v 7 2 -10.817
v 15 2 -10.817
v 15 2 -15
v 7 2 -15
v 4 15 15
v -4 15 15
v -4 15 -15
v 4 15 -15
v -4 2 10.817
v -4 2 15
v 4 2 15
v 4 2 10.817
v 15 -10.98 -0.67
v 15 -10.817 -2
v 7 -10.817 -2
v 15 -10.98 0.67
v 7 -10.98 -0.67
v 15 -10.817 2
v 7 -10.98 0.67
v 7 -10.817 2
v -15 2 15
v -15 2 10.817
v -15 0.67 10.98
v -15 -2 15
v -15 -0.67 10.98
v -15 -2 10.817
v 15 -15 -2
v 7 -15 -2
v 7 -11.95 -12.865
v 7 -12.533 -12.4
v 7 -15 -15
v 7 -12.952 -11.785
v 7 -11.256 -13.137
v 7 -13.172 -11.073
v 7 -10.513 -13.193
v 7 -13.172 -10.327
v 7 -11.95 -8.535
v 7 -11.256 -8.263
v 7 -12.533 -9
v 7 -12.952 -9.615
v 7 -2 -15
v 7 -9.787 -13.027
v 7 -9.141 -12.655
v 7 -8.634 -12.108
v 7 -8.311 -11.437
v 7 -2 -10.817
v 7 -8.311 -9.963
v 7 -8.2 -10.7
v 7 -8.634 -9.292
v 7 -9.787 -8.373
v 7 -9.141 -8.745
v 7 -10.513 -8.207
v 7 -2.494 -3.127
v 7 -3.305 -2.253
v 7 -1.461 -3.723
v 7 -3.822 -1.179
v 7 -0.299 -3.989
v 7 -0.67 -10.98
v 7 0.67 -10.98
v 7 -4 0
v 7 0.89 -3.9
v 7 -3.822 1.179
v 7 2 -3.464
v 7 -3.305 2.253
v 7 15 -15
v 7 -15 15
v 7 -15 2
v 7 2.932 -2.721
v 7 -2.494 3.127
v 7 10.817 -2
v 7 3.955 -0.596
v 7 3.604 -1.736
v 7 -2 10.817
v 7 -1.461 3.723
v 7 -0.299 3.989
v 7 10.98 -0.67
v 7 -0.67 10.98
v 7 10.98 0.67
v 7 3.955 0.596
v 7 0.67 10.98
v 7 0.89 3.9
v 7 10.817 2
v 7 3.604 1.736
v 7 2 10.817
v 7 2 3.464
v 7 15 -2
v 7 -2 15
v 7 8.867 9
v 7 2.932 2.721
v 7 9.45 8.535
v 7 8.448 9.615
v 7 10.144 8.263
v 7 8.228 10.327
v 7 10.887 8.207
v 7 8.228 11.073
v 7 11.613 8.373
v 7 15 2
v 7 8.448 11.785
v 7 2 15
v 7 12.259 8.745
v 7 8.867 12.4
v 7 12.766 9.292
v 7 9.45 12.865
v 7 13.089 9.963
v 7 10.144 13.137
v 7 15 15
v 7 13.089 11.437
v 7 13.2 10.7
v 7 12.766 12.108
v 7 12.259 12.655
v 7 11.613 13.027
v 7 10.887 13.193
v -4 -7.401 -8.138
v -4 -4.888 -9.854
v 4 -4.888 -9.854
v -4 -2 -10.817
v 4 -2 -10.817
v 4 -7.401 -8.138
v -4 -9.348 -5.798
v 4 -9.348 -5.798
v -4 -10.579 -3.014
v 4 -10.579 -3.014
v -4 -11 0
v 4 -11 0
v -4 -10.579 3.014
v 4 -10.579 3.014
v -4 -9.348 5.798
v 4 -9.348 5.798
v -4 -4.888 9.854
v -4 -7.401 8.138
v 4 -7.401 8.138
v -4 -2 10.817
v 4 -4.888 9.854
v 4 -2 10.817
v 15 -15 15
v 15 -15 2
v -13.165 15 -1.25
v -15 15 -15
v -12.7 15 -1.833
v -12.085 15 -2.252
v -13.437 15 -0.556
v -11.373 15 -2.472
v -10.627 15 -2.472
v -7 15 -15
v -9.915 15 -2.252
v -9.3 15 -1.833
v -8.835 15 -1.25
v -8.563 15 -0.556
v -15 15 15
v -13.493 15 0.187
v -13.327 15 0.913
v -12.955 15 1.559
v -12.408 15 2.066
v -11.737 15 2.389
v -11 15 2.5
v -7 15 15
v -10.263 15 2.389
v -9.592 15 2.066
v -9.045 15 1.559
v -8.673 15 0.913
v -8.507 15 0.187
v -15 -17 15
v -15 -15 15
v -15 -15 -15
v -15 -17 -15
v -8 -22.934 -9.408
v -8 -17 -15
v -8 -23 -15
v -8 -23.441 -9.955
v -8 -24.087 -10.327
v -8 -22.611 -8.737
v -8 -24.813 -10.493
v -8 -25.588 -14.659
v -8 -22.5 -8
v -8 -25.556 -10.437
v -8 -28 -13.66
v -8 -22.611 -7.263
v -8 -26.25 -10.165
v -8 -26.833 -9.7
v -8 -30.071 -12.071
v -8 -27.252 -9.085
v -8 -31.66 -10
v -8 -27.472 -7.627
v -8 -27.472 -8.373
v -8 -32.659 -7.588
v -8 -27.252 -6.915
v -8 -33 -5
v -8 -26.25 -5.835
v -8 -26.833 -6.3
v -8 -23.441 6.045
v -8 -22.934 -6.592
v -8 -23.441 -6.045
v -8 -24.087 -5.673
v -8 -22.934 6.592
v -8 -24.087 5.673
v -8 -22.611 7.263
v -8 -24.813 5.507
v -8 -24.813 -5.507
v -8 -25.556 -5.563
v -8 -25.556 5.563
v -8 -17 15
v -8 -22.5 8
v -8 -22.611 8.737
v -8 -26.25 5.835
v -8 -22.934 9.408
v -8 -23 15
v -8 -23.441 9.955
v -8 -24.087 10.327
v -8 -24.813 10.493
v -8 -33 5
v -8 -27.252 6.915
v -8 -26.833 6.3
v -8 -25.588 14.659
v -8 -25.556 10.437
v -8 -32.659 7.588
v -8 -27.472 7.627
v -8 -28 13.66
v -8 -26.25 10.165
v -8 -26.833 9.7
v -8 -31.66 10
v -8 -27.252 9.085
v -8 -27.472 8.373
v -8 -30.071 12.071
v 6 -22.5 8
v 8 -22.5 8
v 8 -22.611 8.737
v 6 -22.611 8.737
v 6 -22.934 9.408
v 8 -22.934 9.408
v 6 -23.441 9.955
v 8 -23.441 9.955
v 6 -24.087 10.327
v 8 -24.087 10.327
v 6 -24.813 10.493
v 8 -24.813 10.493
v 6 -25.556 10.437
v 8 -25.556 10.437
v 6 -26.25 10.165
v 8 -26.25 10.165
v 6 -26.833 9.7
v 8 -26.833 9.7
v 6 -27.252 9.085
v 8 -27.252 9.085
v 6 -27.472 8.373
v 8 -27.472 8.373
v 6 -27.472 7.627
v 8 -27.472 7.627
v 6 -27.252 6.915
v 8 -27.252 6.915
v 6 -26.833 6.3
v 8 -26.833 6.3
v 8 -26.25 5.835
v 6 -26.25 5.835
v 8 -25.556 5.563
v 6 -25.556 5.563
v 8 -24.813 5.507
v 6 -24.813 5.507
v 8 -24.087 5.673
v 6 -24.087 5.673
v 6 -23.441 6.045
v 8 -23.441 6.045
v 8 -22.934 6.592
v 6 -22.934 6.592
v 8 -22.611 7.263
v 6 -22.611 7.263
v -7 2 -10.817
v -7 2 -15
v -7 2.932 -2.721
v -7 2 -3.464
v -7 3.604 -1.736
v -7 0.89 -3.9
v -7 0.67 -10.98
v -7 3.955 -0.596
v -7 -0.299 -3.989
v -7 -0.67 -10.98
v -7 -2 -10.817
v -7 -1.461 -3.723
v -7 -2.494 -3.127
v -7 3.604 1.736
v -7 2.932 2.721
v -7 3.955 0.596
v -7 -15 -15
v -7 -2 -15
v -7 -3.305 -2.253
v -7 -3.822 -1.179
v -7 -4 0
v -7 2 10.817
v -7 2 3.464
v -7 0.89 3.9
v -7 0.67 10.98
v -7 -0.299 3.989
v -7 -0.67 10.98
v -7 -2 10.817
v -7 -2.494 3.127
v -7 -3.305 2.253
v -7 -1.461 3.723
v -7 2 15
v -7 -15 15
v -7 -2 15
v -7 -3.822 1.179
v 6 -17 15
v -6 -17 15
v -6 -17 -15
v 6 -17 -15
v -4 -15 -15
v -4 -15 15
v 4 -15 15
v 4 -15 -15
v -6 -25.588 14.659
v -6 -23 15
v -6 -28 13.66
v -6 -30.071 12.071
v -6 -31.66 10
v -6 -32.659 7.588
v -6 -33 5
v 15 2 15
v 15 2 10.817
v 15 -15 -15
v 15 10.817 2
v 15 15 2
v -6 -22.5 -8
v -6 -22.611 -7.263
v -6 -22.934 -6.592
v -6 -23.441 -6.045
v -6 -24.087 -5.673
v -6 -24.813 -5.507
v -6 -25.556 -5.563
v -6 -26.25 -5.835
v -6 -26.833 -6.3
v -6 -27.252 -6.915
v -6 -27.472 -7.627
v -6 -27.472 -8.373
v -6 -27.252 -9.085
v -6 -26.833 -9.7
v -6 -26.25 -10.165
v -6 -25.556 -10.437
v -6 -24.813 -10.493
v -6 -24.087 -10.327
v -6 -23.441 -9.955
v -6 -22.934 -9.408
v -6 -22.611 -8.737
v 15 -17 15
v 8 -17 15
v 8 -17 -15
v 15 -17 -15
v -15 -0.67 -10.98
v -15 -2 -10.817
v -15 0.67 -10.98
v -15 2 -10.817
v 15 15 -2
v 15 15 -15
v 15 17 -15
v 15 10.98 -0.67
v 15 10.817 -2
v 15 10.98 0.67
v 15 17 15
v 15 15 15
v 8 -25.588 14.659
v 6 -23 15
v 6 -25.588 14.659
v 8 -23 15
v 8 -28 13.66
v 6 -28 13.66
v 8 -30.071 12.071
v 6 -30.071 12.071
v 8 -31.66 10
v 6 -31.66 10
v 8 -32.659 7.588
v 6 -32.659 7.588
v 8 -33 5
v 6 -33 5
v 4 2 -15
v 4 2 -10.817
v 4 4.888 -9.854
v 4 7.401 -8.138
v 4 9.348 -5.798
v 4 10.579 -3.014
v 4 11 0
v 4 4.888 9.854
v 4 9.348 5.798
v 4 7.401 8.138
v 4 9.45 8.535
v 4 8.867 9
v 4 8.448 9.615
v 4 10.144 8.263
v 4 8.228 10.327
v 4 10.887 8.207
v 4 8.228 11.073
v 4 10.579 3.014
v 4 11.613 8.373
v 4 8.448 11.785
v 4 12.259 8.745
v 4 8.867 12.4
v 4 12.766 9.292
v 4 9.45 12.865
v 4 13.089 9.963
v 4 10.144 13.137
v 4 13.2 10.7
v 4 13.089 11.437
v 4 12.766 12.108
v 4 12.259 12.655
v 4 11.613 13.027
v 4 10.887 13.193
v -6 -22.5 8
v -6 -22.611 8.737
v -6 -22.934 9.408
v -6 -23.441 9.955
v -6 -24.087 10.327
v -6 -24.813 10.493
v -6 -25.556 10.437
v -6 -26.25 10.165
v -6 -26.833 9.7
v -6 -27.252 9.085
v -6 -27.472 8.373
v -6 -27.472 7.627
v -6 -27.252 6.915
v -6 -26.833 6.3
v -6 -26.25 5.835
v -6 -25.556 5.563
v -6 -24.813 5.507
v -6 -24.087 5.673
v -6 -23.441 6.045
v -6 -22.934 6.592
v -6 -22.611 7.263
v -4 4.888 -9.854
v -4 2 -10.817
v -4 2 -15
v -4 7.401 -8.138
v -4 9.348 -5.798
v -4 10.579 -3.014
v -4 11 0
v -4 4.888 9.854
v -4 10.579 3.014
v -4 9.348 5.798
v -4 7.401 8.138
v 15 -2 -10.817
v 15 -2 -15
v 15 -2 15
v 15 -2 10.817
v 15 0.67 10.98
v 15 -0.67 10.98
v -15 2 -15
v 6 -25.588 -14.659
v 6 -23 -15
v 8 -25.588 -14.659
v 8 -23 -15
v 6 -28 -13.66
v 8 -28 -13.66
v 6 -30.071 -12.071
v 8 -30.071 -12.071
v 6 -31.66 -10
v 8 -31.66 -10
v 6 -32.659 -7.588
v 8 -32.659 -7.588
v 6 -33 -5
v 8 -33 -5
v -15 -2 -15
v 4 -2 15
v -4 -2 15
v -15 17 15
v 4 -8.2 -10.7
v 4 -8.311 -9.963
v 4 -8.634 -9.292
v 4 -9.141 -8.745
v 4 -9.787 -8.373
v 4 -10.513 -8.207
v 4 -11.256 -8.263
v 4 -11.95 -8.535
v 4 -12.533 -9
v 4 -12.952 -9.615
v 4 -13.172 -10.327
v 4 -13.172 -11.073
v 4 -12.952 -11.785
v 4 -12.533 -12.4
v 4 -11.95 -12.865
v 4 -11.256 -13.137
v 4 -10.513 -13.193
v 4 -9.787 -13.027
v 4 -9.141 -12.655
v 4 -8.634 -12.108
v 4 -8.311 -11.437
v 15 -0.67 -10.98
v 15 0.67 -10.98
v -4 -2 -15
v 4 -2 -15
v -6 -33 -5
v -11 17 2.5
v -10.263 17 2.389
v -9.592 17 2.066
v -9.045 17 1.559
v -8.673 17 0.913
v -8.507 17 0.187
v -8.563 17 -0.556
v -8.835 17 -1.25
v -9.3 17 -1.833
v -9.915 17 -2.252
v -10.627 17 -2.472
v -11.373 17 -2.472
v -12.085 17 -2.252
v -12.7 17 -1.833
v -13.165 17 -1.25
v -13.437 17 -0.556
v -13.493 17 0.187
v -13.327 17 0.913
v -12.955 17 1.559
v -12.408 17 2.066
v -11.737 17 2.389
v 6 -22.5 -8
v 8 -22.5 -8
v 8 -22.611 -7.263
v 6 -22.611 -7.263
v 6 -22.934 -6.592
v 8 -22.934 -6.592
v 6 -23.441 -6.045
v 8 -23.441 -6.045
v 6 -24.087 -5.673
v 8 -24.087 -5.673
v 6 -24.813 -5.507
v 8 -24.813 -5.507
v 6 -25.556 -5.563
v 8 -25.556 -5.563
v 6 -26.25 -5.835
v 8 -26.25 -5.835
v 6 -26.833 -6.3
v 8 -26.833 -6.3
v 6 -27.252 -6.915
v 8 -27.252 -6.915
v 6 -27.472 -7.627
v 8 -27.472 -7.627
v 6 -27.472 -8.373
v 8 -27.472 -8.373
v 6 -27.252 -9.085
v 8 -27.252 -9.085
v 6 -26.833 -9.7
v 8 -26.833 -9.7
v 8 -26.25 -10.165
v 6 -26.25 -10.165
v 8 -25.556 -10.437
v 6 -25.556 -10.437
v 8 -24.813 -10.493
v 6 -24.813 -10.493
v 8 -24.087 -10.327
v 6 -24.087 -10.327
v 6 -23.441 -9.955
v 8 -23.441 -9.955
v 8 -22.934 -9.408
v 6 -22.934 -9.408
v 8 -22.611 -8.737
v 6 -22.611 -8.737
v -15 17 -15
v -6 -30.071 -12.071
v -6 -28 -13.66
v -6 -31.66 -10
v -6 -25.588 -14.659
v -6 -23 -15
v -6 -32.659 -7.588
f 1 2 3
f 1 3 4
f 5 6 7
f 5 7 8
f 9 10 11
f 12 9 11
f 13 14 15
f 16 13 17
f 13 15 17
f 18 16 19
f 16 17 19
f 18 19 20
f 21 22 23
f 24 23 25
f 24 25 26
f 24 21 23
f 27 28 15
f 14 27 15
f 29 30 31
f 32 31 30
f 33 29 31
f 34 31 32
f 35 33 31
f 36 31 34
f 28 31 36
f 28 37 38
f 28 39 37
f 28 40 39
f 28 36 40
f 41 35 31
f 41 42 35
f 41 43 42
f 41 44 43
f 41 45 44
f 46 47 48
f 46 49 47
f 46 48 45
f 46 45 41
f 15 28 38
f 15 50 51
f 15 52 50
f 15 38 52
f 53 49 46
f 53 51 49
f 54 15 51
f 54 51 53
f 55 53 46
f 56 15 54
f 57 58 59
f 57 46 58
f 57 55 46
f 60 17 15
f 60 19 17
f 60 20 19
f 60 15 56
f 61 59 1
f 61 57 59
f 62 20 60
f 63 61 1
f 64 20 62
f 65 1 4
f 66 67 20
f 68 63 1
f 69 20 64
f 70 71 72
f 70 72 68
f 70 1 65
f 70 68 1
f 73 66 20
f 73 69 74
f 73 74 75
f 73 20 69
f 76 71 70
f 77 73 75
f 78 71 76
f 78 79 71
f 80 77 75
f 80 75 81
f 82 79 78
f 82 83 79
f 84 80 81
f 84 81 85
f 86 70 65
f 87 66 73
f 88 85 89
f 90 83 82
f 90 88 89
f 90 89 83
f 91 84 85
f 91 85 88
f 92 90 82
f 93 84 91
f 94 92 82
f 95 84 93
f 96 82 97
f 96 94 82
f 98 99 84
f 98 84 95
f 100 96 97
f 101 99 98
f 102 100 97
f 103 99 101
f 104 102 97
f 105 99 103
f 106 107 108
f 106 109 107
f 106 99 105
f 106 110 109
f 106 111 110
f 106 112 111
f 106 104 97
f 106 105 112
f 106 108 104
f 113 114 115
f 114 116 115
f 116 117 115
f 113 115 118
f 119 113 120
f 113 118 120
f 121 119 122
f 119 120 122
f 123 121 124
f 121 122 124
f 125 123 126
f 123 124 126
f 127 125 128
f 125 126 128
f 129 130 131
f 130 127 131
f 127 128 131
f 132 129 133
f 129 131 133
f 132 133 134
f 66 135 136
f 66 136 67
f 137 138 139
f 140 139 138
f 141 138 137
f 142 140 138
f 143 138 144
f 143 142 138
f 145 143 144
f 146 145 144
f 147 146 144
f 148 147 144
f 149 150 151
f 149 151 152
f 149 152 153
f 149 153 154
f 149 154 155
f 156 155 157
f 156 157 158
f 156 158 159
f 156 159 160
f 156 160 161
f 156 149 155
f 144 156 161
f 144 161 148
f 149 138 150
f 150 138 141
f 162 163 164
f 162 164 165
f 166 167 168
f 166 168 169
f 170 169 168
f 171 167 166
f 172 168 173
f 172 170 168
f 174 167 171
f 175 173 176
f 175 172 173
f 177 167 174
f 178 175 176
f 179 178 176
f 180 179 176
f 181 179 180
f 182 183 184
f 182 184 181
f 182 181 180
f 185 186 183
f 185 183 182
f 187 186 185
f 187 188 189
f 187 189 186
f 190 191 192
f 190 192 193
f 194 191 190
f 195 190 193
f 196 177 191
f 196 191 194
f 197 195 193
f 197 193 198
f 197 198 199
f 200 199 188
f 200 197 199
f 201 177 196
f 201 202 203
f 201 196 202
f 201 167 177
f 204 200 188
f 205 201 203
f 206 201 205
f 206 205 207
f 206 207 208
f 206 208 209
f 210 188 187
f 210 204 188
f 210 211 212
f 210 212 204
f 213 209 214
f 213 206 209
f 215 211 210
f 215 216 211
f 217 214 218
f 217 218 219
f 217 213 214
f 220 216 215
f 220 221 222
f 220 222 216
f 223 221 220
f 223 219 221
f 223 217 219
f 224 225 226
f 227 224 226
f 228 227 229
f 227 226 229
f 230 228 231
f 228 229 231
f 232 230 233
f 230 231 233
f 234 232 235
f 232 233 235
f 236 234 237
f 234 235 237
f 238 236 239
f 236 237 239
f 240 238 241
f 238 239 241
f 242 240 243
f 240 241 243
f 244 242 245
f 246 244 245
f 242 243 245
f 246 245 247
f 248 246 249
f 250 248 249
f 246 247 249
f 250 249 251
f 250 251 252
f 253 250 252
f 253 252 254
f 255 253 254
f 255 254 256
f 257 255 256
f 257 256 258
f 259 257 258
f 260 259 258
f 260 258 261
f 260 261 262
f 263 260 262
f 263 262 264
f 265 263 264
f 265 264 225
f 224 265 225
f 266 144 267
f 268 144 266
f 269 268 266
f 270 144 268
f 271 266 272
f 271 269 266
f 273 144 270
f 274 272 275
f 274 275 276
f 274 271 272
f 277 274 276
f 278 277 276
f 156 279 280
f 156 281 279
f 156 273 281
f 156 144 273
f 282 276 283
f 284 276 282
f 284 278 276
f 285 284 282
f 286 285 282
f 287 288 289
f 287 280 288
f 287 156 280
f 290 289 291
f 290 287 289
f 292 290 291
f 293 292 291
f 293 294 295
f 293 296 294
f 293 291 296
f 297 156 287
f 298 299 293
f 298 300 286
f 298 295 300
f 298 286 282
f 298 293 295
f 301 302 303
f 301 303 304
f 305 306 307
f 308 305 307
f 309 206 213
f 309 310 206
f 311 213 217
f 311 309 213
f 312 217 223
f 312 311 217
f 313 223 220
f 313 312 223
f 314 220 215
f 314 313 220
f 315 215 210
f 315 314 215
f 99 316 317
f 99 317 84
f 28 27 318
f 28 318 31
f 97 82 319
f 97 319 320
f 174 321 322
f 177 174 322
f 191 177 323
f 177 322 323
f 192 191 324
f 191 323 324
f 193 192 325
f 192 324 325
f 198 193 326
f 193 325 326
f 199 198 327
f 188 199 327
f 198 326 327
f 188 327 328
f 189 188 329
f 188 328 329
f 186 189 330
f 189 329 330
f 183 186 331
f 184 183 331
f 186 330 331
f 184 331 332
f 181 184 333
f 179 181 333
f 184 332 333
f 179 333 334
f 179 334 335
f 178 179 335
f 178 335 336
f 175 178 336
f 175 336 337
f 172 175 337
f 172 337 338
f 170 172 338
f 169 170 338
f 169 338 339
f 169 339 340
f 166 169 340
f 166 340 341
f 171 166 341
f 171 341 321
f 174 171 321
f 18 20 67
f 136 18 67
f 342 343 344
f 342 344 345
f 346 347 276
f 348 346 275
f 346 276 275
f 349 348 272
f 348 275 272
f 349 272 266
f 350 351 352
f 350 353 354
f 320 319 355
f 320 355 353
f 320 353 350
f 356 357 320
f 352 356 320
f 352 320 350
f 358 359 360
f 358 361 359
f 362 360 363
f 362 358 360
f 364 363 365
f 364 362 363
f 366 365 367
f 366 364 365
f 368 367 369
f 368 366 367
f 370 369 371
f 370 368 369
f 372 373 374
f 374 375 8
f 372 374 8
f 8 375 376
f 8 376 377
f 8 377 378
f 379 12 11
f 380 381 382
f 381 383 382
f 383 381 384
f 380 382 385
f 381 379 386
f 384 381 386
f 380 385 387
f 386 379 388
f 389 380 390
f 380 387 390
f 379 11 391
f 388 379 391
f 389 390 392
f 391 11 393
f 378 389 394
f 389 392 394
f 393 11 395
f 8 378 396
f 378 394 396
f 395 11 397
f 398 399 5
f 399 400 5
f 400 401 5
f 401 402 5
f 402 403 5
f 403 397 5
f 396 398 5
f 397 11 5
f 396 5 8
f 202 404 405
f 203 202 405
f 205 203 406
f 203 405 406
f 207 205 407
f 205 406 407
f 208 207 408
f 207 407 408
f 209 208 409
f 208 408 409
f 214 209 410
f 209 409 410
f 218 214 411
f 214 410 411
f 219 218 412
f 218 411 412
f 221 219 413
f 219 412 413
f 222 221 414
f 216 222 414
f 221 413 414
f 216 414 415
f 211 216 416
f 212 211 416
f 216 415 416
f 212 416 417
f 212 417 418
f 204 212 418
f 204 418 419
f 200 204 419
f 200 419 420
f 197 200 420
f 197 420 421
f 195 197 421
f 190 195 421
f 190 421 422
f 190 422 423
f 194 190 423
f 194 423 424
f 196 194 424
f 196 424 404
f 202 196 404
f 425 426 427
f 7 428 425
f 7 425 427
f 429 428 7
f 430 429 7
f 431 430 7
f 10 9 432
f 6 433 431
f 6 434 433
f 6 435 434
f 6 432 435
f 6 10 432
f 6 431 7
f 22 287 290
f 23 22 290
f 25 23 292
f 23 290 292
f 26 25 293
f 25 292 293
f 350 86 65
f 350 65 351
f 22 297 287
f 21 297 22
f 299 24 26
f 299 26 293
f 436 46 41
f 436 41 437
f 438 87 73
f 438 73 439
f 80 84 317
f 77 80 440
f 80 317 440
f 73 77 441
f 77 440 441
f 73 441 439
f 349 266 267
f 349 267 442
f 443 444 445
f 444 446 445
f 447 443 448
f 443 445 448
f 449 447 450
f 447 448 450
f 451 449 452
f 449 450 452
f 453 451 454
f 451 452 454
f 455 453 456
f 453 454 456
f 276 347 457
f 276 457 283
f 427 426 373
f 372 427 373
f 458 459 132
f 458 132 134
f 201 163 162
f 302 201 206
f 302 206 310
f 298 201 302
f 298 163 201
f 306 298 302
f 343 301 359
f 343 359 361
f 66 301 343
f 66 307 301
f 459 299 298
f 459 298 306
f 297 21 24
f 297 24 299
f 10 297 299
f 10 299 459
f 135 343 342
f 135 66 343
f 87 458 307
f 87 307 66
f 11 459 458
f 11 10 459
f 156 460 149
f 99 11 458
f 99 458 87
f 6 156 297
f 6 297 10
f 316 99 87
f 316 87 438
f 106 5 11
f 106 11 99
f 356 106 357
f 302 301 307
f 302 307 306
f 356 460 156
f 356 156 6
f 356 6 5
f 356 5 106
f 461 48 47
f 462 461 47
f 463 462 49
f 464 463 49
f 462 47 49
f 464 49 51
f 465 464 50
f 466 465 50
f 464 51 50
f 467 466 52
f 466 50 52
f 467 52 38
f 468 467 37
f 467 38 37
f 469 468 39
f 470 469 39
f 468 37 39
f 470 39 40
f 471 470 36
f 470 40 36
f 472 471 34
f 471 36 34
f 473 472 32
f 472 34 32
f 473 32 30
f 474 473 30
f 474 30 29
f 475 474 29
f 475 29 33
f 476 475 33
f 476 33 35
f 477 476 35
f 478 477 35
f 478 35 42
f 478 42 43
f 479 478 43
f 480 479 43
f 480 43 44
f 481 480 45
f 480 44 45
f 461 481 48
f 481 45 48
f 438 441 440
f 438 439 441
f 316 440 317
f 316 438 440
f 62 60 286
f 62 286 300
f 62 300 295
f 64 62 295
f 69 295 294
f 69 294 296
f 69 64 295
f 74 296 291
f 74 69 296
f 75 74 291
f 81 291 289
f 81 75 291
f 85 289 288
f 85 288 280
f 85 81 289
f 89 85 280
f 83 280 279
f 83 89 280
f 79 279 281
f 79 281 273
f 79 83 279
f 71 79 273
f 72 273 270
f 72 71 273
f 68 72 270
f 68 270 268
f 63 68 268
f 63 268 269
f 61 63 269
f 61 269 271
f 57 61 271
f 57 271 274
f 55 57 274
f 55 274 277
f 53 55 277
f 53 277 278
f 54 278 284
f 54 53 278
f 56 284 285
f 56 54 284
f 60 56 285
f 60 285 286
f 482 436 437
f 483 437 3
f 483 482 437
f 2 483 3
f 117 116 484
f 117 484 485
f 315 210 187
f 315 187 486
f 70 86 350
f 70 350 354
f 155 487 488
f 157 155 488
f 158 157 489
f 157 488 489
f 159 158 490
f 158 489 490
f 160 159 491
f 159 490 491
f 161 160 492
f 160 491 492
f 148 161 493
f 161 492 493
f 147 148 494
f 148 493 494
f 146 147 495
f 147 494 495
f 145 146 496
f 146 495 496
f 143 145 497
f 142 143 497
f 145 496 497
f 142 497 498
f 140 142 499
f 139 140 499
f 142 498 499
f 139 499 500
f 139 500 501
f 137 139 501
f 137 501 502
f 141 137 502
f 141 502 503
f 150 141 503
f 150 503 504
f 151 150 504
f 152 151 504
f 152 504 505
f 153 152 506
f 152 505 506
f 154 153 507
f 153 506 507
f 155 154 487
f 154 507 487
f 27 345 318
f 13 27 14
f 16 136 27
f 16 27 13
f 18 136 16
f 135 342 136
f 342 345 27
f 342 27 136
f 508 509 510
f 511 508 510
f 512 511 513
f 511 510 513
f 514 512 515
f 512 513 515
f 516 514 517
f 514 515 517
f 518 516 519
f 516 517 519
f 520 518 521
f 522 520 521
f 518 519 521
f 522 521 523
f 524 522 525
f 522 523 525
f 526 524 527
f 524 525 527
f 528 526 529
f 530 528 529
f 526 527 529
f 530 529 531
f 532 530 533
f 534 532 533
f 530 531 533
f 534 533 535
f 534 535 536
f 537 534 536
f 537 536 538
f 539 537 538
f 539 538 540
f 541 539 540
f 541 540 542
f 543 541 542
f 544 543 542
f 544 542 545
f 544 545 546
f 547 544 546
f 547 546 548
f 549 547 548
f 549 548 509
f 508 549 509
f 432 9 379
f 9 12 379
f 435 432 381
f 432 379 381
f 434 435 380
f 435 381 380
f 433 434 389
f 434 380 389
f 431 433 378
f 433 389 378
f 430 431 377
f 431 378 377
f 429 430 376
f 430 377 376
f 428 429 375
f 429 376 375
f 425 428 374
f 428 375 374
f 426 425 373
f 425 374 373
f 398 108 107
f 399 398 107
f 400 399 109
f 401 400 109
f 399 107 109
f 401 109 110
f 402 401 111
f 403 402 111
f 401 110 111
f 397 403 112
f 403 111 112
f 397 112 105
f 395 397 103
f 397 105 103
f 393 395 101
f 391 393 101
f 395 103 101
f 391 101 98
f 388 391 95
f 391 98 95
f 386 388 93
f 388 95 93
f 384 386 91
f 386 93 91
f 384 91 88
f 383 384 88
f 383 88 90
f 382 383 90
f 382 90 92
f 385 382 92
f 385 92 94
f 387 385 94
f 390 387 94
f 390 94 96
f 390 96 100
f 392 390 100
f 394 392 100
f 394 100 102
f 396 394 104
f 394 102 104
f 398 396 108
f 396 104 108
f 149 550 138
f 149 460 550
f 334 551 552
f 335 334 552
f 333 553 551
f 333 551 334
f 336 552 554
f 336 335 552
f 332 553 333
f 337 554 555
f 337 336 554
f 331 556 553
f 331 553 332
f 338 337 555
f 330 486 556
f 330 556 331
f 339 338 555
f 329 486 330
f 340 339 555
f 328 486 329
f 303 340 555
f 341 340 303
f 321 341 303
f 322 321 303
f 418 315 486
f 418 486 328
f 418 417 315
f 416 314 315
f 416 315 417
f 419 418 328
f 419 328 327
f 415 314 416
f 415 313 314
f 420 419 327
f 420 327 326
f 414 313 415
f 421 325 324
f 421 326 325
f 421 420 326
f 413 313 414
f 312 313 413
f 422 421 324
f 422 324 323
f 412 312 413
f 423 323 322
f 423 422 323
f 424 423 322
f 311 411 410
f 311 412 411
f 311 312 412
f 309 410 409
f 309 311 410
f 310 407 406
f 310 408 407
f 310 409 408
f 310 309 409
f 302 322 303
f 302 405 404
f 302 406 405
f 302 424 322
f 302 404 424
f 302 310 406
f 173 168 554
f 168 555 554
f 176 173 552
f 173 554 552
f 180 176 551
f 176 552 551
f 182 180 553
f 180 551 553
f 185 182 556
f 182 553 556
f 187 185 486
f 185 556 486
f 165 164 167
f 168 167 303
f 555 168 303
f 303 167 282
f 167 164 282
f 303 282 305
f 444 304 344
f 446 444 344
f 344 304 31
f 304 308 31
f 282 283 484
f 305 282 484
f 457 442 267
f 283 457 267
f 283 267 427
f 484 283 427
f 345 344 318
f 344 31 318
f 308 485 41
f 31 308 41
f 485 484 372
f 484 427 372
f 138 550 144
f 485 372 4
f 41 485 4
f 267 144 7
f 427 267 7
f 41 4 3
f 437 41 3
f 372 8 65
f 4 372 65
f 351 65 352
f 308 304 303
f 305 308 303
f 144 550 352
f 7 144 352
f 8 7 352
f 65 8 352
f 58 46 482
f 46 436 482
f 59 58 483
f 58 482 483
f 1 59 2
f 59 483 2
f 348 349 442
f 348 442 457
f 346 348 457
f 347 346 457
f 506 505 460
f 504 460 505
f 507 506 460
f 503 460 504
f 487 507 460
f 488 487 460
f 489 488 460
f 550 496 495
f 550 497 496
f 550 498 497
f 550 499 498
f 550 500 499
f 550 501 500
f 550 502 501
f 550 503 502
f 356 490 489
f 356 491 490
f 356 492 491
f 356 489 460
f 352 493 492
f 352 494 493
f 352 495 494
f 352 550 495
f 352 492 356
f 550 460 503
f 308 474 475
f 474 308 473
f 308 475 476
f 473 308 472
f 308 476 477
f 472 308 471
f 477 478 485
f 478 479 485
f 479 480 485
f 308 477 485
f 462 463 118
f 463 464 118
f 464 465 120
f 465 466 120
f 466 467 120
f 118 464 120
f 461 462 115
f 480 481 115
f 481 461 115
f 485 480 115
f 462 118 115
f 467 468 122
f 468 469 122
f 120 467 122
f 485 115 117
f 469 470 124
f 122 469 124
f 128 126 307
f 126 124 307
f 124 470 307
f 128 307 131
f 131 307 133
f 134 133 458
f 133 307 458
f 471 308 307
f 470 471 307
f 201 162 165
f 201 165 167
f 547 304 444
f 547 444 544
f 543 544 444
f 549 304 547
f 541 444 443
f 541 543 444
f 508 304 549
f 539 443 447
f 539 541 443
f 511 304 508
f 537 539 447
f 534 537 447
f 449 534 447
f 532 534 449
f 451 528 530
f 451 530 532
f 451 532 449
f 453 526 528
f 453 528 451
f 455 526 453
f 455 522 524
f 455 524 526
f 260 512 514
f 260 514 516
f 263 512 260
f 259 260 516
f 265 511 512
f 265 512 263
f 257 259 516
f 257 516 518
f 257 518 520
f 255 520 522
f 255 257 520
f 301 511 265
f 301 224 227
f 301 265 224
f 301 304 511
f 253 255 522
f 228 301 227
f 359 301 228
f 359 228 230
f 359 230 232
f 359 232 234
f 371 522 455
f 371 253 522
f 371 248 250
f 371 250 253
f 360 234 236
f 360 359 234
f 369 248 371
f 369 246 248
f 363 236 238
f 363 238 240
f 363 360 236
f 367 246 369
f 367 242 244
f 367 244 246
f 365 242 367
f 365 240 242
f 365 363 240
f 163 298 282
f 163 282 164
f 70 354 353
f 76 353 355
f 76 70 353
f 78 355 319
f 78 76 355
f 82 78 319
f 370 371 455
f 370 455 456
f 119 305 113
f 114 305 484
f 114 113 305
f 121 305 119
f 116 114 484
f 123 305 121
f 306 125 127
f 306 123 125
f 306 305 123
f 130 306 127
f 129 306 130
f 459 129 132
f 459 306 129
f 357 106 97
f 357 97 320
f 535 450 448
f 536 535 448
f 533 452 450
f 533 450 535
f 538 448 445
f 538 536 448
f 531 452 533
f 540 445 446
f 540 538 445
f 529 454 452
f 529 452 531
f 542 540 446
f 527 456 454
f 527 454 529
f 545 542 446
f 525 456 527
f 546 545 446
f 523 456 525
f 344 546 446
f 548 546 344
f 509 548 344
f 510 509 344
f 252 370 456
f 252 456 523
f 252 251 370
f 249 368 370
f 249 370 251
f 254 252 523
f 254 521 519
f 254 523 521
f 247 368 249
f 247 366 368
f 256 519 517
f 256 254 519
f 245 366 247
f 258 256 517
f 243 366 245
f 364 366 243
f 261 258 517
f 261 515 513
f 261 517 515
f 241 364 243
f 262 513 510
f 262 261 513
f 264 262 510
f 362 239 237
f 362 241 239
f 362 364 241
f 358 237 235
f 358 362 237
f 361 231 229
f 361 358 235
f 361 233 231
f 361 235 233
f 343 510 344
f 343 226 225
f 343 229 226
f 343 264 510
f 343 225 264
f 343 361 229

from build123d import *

# Parameters (mm, degrees)
CROQUIS1_W              = 8
CROQUIS1_H              = 13
SALIENTE_EXTRUIR1_DEPTH = 15
CROQUIS3_R              = 11
CORTAR_EXTRUIR1_DEPTH   = 15
CROQUIS4_R              = 2.5
CORTAR_EXTRUIR2_DEPTH   = 30
REDONDEO1_R             = 10
CROQUIS5_R              = 2.5
CORTAR_EXTRUIR3_DEPTH   = 2
BOSS_EXTRUDE1_REACH     = 44.403
SKETCH2_R               = 2.5
CUT_EXTRUDE1_DEPTH      = 3
BOSS_EXTRUDE2_START     = -14
SKETCH3_R               = 11
SKETCH3_R_2             = 4
BOSS_EXTRUDE2_DEPTH     = 14
SKETCH4_R               = 2.5
BOSS_EXTRUDE4_DEPTH     = 2


with BuildPart() as part:
    # Croquis1 → Saliente-Extruir1 (new, symmetric)
    with BuildSketch(Plane.XY):
        Polygon((-15, -2), (-7, -2), (-7, -15), (-15, -15), (-15, -17), (-8, -17), (-8, -33), (-6, -33), (-6, -17), (6, -17), (6, -33), (8, -33), (8, -17), (15, -17), (15, -15), (7, -15), (7, -2), (15, -2), (15, 2), (7, 2), (7, 15), (15, 15), (15, 17), (-15, 17), (-15, 15), (-7, 15), (-7, 2), (-15, 2), align=None)
        with Locations((0, 8.5)):
            Rectangle(CROQUIS1_W, CROQUIS1_H, mode=Mode.SUBTRACT)
        with Locations((0, -8.5)):
            Rectangle(CROQUIS1_W, CROQUIS1_H, mode=Mode.SUBTRACT)
    extrude(amount=SALIENTE_EXTRUIR1_DEPTH, both=True)

    # Croquis3 → Cortar-Extruir1 (cut, symmetric)
    with BuildSketch(Plane(origin=(0, 0, 0), x_dir=(0, 0, -1), z_dir=(1, 0, 0))):
        with Locations(Location((0, 0, 0), (0, 0, 10.475681696))):
            Circle(CROQUIS3_R)
    extrude(amount=CORTAR_EXTRUIR1_DEPTH, both=True, mode=Mode.SUBTRACT)

    # Croquis4 → Cortar-Extruir2 (cut)
    with BuildSketch(Plane(origin=(8, 0, 0), x_dir=(0, 0, -1), z_dir=(1, 0, 0))):
        with Locations(Location((-8, -25, 0), (0, 0, 90))):
            Circle(CROQUIS4_R)
        with Locations(Location((8, -25, 0), (0, 0, 90))):
            Circle(CROQUIS4_R)
    extrude(amount=-CORTAR_EXTRUIR2_DEPTH, mode=Mode.SUBTRACT)

    # Redondeo1
    redondeo1_edges = [part.edges().sort_by_distance(p)[0] for p in [
        (7, -33, -15),
        (-7, -33, -15),
        (-7, -33, 15),
        (7, -33, 15),
    ]]
    fillet(redondeo1_edges, radius=REDONDEO1_R)

    # Croquis5 → Cortar-Extruir3 (cut)
    with BuildSketch(Plane(origin=(0, 17, 0), x_dir=(1, 0, 0), z_dir=(0, 1, 0))):
        with Locations(Location((-11, 0, 0), (0, 0, 270))):
            Circle(CROQUIS5_R)
        with Locations(Location((11, 0, 0), (0, 0, 270))):
            Circle(CROQUIS5_R)
    extrude(amount=-CORTAR_EXTRUIR3_DEPTH, mode=Mode.SUBTRACT)

    # Boss-Extrude1: up to this face of the body (flat: up to its plane)
    boss_extrude1_end = Plane(part.part.faces().sort_by_distance((15, 0, 12.969177885))[0])
    # Sketch1 → Boss-Extrude1 (add, up to the picked face)
    with BuildSketch(Plane(origin=(7, 0, 0), x_dir=(0, 0, -1), z_dir=(1, 0, 0)), mode=Mode.PRIVATE) as boss_extrude1_sk1:
        with BuildLine():
            Line((-2, 15), (2, 15))
            Line((2, 15), (2, 10.816653826))
            ThreePointArc((2, 10.816653826), (0, 11), (-2, 10.816653826))
            Line((-2, 10.816653826), (-2, 15))
        make_face()
    boss_extrude1_tool1 = split(extrude(boss_extrude1_sk1.sketch, amount=BOSS_EXTRUDE1_REACH, mode=Mode.PRIVATE), bisect_by=boss_extrude1_end, keep=Keep.BOTH, mode=Mode.PRIVATE)
    boss_extrude1 = boss_extrude1_tool1.solids().sort_by(Axis((7, 12.969178, 0), (1, 0, 0)))[0]
    add(boss_extrude1)

    # Mirror1: Boss-Extrude1 across plane
    add(boss_extrude1.mirror(Plane.ZX))

    # Sketch2 → Cut-Extrude1 (cut)
    with BuildSketch(Plane(origin=(7, 0, 0), x_dir=(0, 0, -1), z_dir=(1, 0, 0))):
        with Locations(Location((-10.7, 10.7, 0), (0, 0, 90))):
            Circle(SKETCH2_R)
        with Locations(Location((10.7, -10.7, 0), (0, 0, 90))):
            Circle(SKETCH2_R)
    extrude(amount=-CUT_EXTRUDE1_DEPTH, mode=Mode.SUBTRACT)

    # Sketch3 → Boss-Extrude2 (add)
    with BuildSketch(Plane.ZY.offset(7).offset(BOSS_EXTRUDE2_START)):
        Circle(SKETCH3_R)
        with Locations(Location((0, 0, 0), (0, 0, 270))):
            Circle(SKETCH3_R_2, mode=Mode.SUBTRACT)
    boss_extrude2 = extrude(amount=BOSS_EXTRUDE2_DEPTH)

    # Mirror2: Boss-Extrude2 across plane
    add(boss_extrude2.mirror(Plane(origin=(0, 0, 0), x_dir=(0, 0, 1), z_dir=(1, 0, 0))))

    # Sketch4 → Boss-Extrude4 (add)
    with BuildSketch(Plane(origin=(0, 17, 0), x_dir=(1, 0, 0), z_dir=(0, 1, 0))):
        with Locations((11, 0)):
            Circle(SKETCH4_R)
    extrude(amount=-BOSS_EXTRUDE4_DEPTH)


solid = part.part
